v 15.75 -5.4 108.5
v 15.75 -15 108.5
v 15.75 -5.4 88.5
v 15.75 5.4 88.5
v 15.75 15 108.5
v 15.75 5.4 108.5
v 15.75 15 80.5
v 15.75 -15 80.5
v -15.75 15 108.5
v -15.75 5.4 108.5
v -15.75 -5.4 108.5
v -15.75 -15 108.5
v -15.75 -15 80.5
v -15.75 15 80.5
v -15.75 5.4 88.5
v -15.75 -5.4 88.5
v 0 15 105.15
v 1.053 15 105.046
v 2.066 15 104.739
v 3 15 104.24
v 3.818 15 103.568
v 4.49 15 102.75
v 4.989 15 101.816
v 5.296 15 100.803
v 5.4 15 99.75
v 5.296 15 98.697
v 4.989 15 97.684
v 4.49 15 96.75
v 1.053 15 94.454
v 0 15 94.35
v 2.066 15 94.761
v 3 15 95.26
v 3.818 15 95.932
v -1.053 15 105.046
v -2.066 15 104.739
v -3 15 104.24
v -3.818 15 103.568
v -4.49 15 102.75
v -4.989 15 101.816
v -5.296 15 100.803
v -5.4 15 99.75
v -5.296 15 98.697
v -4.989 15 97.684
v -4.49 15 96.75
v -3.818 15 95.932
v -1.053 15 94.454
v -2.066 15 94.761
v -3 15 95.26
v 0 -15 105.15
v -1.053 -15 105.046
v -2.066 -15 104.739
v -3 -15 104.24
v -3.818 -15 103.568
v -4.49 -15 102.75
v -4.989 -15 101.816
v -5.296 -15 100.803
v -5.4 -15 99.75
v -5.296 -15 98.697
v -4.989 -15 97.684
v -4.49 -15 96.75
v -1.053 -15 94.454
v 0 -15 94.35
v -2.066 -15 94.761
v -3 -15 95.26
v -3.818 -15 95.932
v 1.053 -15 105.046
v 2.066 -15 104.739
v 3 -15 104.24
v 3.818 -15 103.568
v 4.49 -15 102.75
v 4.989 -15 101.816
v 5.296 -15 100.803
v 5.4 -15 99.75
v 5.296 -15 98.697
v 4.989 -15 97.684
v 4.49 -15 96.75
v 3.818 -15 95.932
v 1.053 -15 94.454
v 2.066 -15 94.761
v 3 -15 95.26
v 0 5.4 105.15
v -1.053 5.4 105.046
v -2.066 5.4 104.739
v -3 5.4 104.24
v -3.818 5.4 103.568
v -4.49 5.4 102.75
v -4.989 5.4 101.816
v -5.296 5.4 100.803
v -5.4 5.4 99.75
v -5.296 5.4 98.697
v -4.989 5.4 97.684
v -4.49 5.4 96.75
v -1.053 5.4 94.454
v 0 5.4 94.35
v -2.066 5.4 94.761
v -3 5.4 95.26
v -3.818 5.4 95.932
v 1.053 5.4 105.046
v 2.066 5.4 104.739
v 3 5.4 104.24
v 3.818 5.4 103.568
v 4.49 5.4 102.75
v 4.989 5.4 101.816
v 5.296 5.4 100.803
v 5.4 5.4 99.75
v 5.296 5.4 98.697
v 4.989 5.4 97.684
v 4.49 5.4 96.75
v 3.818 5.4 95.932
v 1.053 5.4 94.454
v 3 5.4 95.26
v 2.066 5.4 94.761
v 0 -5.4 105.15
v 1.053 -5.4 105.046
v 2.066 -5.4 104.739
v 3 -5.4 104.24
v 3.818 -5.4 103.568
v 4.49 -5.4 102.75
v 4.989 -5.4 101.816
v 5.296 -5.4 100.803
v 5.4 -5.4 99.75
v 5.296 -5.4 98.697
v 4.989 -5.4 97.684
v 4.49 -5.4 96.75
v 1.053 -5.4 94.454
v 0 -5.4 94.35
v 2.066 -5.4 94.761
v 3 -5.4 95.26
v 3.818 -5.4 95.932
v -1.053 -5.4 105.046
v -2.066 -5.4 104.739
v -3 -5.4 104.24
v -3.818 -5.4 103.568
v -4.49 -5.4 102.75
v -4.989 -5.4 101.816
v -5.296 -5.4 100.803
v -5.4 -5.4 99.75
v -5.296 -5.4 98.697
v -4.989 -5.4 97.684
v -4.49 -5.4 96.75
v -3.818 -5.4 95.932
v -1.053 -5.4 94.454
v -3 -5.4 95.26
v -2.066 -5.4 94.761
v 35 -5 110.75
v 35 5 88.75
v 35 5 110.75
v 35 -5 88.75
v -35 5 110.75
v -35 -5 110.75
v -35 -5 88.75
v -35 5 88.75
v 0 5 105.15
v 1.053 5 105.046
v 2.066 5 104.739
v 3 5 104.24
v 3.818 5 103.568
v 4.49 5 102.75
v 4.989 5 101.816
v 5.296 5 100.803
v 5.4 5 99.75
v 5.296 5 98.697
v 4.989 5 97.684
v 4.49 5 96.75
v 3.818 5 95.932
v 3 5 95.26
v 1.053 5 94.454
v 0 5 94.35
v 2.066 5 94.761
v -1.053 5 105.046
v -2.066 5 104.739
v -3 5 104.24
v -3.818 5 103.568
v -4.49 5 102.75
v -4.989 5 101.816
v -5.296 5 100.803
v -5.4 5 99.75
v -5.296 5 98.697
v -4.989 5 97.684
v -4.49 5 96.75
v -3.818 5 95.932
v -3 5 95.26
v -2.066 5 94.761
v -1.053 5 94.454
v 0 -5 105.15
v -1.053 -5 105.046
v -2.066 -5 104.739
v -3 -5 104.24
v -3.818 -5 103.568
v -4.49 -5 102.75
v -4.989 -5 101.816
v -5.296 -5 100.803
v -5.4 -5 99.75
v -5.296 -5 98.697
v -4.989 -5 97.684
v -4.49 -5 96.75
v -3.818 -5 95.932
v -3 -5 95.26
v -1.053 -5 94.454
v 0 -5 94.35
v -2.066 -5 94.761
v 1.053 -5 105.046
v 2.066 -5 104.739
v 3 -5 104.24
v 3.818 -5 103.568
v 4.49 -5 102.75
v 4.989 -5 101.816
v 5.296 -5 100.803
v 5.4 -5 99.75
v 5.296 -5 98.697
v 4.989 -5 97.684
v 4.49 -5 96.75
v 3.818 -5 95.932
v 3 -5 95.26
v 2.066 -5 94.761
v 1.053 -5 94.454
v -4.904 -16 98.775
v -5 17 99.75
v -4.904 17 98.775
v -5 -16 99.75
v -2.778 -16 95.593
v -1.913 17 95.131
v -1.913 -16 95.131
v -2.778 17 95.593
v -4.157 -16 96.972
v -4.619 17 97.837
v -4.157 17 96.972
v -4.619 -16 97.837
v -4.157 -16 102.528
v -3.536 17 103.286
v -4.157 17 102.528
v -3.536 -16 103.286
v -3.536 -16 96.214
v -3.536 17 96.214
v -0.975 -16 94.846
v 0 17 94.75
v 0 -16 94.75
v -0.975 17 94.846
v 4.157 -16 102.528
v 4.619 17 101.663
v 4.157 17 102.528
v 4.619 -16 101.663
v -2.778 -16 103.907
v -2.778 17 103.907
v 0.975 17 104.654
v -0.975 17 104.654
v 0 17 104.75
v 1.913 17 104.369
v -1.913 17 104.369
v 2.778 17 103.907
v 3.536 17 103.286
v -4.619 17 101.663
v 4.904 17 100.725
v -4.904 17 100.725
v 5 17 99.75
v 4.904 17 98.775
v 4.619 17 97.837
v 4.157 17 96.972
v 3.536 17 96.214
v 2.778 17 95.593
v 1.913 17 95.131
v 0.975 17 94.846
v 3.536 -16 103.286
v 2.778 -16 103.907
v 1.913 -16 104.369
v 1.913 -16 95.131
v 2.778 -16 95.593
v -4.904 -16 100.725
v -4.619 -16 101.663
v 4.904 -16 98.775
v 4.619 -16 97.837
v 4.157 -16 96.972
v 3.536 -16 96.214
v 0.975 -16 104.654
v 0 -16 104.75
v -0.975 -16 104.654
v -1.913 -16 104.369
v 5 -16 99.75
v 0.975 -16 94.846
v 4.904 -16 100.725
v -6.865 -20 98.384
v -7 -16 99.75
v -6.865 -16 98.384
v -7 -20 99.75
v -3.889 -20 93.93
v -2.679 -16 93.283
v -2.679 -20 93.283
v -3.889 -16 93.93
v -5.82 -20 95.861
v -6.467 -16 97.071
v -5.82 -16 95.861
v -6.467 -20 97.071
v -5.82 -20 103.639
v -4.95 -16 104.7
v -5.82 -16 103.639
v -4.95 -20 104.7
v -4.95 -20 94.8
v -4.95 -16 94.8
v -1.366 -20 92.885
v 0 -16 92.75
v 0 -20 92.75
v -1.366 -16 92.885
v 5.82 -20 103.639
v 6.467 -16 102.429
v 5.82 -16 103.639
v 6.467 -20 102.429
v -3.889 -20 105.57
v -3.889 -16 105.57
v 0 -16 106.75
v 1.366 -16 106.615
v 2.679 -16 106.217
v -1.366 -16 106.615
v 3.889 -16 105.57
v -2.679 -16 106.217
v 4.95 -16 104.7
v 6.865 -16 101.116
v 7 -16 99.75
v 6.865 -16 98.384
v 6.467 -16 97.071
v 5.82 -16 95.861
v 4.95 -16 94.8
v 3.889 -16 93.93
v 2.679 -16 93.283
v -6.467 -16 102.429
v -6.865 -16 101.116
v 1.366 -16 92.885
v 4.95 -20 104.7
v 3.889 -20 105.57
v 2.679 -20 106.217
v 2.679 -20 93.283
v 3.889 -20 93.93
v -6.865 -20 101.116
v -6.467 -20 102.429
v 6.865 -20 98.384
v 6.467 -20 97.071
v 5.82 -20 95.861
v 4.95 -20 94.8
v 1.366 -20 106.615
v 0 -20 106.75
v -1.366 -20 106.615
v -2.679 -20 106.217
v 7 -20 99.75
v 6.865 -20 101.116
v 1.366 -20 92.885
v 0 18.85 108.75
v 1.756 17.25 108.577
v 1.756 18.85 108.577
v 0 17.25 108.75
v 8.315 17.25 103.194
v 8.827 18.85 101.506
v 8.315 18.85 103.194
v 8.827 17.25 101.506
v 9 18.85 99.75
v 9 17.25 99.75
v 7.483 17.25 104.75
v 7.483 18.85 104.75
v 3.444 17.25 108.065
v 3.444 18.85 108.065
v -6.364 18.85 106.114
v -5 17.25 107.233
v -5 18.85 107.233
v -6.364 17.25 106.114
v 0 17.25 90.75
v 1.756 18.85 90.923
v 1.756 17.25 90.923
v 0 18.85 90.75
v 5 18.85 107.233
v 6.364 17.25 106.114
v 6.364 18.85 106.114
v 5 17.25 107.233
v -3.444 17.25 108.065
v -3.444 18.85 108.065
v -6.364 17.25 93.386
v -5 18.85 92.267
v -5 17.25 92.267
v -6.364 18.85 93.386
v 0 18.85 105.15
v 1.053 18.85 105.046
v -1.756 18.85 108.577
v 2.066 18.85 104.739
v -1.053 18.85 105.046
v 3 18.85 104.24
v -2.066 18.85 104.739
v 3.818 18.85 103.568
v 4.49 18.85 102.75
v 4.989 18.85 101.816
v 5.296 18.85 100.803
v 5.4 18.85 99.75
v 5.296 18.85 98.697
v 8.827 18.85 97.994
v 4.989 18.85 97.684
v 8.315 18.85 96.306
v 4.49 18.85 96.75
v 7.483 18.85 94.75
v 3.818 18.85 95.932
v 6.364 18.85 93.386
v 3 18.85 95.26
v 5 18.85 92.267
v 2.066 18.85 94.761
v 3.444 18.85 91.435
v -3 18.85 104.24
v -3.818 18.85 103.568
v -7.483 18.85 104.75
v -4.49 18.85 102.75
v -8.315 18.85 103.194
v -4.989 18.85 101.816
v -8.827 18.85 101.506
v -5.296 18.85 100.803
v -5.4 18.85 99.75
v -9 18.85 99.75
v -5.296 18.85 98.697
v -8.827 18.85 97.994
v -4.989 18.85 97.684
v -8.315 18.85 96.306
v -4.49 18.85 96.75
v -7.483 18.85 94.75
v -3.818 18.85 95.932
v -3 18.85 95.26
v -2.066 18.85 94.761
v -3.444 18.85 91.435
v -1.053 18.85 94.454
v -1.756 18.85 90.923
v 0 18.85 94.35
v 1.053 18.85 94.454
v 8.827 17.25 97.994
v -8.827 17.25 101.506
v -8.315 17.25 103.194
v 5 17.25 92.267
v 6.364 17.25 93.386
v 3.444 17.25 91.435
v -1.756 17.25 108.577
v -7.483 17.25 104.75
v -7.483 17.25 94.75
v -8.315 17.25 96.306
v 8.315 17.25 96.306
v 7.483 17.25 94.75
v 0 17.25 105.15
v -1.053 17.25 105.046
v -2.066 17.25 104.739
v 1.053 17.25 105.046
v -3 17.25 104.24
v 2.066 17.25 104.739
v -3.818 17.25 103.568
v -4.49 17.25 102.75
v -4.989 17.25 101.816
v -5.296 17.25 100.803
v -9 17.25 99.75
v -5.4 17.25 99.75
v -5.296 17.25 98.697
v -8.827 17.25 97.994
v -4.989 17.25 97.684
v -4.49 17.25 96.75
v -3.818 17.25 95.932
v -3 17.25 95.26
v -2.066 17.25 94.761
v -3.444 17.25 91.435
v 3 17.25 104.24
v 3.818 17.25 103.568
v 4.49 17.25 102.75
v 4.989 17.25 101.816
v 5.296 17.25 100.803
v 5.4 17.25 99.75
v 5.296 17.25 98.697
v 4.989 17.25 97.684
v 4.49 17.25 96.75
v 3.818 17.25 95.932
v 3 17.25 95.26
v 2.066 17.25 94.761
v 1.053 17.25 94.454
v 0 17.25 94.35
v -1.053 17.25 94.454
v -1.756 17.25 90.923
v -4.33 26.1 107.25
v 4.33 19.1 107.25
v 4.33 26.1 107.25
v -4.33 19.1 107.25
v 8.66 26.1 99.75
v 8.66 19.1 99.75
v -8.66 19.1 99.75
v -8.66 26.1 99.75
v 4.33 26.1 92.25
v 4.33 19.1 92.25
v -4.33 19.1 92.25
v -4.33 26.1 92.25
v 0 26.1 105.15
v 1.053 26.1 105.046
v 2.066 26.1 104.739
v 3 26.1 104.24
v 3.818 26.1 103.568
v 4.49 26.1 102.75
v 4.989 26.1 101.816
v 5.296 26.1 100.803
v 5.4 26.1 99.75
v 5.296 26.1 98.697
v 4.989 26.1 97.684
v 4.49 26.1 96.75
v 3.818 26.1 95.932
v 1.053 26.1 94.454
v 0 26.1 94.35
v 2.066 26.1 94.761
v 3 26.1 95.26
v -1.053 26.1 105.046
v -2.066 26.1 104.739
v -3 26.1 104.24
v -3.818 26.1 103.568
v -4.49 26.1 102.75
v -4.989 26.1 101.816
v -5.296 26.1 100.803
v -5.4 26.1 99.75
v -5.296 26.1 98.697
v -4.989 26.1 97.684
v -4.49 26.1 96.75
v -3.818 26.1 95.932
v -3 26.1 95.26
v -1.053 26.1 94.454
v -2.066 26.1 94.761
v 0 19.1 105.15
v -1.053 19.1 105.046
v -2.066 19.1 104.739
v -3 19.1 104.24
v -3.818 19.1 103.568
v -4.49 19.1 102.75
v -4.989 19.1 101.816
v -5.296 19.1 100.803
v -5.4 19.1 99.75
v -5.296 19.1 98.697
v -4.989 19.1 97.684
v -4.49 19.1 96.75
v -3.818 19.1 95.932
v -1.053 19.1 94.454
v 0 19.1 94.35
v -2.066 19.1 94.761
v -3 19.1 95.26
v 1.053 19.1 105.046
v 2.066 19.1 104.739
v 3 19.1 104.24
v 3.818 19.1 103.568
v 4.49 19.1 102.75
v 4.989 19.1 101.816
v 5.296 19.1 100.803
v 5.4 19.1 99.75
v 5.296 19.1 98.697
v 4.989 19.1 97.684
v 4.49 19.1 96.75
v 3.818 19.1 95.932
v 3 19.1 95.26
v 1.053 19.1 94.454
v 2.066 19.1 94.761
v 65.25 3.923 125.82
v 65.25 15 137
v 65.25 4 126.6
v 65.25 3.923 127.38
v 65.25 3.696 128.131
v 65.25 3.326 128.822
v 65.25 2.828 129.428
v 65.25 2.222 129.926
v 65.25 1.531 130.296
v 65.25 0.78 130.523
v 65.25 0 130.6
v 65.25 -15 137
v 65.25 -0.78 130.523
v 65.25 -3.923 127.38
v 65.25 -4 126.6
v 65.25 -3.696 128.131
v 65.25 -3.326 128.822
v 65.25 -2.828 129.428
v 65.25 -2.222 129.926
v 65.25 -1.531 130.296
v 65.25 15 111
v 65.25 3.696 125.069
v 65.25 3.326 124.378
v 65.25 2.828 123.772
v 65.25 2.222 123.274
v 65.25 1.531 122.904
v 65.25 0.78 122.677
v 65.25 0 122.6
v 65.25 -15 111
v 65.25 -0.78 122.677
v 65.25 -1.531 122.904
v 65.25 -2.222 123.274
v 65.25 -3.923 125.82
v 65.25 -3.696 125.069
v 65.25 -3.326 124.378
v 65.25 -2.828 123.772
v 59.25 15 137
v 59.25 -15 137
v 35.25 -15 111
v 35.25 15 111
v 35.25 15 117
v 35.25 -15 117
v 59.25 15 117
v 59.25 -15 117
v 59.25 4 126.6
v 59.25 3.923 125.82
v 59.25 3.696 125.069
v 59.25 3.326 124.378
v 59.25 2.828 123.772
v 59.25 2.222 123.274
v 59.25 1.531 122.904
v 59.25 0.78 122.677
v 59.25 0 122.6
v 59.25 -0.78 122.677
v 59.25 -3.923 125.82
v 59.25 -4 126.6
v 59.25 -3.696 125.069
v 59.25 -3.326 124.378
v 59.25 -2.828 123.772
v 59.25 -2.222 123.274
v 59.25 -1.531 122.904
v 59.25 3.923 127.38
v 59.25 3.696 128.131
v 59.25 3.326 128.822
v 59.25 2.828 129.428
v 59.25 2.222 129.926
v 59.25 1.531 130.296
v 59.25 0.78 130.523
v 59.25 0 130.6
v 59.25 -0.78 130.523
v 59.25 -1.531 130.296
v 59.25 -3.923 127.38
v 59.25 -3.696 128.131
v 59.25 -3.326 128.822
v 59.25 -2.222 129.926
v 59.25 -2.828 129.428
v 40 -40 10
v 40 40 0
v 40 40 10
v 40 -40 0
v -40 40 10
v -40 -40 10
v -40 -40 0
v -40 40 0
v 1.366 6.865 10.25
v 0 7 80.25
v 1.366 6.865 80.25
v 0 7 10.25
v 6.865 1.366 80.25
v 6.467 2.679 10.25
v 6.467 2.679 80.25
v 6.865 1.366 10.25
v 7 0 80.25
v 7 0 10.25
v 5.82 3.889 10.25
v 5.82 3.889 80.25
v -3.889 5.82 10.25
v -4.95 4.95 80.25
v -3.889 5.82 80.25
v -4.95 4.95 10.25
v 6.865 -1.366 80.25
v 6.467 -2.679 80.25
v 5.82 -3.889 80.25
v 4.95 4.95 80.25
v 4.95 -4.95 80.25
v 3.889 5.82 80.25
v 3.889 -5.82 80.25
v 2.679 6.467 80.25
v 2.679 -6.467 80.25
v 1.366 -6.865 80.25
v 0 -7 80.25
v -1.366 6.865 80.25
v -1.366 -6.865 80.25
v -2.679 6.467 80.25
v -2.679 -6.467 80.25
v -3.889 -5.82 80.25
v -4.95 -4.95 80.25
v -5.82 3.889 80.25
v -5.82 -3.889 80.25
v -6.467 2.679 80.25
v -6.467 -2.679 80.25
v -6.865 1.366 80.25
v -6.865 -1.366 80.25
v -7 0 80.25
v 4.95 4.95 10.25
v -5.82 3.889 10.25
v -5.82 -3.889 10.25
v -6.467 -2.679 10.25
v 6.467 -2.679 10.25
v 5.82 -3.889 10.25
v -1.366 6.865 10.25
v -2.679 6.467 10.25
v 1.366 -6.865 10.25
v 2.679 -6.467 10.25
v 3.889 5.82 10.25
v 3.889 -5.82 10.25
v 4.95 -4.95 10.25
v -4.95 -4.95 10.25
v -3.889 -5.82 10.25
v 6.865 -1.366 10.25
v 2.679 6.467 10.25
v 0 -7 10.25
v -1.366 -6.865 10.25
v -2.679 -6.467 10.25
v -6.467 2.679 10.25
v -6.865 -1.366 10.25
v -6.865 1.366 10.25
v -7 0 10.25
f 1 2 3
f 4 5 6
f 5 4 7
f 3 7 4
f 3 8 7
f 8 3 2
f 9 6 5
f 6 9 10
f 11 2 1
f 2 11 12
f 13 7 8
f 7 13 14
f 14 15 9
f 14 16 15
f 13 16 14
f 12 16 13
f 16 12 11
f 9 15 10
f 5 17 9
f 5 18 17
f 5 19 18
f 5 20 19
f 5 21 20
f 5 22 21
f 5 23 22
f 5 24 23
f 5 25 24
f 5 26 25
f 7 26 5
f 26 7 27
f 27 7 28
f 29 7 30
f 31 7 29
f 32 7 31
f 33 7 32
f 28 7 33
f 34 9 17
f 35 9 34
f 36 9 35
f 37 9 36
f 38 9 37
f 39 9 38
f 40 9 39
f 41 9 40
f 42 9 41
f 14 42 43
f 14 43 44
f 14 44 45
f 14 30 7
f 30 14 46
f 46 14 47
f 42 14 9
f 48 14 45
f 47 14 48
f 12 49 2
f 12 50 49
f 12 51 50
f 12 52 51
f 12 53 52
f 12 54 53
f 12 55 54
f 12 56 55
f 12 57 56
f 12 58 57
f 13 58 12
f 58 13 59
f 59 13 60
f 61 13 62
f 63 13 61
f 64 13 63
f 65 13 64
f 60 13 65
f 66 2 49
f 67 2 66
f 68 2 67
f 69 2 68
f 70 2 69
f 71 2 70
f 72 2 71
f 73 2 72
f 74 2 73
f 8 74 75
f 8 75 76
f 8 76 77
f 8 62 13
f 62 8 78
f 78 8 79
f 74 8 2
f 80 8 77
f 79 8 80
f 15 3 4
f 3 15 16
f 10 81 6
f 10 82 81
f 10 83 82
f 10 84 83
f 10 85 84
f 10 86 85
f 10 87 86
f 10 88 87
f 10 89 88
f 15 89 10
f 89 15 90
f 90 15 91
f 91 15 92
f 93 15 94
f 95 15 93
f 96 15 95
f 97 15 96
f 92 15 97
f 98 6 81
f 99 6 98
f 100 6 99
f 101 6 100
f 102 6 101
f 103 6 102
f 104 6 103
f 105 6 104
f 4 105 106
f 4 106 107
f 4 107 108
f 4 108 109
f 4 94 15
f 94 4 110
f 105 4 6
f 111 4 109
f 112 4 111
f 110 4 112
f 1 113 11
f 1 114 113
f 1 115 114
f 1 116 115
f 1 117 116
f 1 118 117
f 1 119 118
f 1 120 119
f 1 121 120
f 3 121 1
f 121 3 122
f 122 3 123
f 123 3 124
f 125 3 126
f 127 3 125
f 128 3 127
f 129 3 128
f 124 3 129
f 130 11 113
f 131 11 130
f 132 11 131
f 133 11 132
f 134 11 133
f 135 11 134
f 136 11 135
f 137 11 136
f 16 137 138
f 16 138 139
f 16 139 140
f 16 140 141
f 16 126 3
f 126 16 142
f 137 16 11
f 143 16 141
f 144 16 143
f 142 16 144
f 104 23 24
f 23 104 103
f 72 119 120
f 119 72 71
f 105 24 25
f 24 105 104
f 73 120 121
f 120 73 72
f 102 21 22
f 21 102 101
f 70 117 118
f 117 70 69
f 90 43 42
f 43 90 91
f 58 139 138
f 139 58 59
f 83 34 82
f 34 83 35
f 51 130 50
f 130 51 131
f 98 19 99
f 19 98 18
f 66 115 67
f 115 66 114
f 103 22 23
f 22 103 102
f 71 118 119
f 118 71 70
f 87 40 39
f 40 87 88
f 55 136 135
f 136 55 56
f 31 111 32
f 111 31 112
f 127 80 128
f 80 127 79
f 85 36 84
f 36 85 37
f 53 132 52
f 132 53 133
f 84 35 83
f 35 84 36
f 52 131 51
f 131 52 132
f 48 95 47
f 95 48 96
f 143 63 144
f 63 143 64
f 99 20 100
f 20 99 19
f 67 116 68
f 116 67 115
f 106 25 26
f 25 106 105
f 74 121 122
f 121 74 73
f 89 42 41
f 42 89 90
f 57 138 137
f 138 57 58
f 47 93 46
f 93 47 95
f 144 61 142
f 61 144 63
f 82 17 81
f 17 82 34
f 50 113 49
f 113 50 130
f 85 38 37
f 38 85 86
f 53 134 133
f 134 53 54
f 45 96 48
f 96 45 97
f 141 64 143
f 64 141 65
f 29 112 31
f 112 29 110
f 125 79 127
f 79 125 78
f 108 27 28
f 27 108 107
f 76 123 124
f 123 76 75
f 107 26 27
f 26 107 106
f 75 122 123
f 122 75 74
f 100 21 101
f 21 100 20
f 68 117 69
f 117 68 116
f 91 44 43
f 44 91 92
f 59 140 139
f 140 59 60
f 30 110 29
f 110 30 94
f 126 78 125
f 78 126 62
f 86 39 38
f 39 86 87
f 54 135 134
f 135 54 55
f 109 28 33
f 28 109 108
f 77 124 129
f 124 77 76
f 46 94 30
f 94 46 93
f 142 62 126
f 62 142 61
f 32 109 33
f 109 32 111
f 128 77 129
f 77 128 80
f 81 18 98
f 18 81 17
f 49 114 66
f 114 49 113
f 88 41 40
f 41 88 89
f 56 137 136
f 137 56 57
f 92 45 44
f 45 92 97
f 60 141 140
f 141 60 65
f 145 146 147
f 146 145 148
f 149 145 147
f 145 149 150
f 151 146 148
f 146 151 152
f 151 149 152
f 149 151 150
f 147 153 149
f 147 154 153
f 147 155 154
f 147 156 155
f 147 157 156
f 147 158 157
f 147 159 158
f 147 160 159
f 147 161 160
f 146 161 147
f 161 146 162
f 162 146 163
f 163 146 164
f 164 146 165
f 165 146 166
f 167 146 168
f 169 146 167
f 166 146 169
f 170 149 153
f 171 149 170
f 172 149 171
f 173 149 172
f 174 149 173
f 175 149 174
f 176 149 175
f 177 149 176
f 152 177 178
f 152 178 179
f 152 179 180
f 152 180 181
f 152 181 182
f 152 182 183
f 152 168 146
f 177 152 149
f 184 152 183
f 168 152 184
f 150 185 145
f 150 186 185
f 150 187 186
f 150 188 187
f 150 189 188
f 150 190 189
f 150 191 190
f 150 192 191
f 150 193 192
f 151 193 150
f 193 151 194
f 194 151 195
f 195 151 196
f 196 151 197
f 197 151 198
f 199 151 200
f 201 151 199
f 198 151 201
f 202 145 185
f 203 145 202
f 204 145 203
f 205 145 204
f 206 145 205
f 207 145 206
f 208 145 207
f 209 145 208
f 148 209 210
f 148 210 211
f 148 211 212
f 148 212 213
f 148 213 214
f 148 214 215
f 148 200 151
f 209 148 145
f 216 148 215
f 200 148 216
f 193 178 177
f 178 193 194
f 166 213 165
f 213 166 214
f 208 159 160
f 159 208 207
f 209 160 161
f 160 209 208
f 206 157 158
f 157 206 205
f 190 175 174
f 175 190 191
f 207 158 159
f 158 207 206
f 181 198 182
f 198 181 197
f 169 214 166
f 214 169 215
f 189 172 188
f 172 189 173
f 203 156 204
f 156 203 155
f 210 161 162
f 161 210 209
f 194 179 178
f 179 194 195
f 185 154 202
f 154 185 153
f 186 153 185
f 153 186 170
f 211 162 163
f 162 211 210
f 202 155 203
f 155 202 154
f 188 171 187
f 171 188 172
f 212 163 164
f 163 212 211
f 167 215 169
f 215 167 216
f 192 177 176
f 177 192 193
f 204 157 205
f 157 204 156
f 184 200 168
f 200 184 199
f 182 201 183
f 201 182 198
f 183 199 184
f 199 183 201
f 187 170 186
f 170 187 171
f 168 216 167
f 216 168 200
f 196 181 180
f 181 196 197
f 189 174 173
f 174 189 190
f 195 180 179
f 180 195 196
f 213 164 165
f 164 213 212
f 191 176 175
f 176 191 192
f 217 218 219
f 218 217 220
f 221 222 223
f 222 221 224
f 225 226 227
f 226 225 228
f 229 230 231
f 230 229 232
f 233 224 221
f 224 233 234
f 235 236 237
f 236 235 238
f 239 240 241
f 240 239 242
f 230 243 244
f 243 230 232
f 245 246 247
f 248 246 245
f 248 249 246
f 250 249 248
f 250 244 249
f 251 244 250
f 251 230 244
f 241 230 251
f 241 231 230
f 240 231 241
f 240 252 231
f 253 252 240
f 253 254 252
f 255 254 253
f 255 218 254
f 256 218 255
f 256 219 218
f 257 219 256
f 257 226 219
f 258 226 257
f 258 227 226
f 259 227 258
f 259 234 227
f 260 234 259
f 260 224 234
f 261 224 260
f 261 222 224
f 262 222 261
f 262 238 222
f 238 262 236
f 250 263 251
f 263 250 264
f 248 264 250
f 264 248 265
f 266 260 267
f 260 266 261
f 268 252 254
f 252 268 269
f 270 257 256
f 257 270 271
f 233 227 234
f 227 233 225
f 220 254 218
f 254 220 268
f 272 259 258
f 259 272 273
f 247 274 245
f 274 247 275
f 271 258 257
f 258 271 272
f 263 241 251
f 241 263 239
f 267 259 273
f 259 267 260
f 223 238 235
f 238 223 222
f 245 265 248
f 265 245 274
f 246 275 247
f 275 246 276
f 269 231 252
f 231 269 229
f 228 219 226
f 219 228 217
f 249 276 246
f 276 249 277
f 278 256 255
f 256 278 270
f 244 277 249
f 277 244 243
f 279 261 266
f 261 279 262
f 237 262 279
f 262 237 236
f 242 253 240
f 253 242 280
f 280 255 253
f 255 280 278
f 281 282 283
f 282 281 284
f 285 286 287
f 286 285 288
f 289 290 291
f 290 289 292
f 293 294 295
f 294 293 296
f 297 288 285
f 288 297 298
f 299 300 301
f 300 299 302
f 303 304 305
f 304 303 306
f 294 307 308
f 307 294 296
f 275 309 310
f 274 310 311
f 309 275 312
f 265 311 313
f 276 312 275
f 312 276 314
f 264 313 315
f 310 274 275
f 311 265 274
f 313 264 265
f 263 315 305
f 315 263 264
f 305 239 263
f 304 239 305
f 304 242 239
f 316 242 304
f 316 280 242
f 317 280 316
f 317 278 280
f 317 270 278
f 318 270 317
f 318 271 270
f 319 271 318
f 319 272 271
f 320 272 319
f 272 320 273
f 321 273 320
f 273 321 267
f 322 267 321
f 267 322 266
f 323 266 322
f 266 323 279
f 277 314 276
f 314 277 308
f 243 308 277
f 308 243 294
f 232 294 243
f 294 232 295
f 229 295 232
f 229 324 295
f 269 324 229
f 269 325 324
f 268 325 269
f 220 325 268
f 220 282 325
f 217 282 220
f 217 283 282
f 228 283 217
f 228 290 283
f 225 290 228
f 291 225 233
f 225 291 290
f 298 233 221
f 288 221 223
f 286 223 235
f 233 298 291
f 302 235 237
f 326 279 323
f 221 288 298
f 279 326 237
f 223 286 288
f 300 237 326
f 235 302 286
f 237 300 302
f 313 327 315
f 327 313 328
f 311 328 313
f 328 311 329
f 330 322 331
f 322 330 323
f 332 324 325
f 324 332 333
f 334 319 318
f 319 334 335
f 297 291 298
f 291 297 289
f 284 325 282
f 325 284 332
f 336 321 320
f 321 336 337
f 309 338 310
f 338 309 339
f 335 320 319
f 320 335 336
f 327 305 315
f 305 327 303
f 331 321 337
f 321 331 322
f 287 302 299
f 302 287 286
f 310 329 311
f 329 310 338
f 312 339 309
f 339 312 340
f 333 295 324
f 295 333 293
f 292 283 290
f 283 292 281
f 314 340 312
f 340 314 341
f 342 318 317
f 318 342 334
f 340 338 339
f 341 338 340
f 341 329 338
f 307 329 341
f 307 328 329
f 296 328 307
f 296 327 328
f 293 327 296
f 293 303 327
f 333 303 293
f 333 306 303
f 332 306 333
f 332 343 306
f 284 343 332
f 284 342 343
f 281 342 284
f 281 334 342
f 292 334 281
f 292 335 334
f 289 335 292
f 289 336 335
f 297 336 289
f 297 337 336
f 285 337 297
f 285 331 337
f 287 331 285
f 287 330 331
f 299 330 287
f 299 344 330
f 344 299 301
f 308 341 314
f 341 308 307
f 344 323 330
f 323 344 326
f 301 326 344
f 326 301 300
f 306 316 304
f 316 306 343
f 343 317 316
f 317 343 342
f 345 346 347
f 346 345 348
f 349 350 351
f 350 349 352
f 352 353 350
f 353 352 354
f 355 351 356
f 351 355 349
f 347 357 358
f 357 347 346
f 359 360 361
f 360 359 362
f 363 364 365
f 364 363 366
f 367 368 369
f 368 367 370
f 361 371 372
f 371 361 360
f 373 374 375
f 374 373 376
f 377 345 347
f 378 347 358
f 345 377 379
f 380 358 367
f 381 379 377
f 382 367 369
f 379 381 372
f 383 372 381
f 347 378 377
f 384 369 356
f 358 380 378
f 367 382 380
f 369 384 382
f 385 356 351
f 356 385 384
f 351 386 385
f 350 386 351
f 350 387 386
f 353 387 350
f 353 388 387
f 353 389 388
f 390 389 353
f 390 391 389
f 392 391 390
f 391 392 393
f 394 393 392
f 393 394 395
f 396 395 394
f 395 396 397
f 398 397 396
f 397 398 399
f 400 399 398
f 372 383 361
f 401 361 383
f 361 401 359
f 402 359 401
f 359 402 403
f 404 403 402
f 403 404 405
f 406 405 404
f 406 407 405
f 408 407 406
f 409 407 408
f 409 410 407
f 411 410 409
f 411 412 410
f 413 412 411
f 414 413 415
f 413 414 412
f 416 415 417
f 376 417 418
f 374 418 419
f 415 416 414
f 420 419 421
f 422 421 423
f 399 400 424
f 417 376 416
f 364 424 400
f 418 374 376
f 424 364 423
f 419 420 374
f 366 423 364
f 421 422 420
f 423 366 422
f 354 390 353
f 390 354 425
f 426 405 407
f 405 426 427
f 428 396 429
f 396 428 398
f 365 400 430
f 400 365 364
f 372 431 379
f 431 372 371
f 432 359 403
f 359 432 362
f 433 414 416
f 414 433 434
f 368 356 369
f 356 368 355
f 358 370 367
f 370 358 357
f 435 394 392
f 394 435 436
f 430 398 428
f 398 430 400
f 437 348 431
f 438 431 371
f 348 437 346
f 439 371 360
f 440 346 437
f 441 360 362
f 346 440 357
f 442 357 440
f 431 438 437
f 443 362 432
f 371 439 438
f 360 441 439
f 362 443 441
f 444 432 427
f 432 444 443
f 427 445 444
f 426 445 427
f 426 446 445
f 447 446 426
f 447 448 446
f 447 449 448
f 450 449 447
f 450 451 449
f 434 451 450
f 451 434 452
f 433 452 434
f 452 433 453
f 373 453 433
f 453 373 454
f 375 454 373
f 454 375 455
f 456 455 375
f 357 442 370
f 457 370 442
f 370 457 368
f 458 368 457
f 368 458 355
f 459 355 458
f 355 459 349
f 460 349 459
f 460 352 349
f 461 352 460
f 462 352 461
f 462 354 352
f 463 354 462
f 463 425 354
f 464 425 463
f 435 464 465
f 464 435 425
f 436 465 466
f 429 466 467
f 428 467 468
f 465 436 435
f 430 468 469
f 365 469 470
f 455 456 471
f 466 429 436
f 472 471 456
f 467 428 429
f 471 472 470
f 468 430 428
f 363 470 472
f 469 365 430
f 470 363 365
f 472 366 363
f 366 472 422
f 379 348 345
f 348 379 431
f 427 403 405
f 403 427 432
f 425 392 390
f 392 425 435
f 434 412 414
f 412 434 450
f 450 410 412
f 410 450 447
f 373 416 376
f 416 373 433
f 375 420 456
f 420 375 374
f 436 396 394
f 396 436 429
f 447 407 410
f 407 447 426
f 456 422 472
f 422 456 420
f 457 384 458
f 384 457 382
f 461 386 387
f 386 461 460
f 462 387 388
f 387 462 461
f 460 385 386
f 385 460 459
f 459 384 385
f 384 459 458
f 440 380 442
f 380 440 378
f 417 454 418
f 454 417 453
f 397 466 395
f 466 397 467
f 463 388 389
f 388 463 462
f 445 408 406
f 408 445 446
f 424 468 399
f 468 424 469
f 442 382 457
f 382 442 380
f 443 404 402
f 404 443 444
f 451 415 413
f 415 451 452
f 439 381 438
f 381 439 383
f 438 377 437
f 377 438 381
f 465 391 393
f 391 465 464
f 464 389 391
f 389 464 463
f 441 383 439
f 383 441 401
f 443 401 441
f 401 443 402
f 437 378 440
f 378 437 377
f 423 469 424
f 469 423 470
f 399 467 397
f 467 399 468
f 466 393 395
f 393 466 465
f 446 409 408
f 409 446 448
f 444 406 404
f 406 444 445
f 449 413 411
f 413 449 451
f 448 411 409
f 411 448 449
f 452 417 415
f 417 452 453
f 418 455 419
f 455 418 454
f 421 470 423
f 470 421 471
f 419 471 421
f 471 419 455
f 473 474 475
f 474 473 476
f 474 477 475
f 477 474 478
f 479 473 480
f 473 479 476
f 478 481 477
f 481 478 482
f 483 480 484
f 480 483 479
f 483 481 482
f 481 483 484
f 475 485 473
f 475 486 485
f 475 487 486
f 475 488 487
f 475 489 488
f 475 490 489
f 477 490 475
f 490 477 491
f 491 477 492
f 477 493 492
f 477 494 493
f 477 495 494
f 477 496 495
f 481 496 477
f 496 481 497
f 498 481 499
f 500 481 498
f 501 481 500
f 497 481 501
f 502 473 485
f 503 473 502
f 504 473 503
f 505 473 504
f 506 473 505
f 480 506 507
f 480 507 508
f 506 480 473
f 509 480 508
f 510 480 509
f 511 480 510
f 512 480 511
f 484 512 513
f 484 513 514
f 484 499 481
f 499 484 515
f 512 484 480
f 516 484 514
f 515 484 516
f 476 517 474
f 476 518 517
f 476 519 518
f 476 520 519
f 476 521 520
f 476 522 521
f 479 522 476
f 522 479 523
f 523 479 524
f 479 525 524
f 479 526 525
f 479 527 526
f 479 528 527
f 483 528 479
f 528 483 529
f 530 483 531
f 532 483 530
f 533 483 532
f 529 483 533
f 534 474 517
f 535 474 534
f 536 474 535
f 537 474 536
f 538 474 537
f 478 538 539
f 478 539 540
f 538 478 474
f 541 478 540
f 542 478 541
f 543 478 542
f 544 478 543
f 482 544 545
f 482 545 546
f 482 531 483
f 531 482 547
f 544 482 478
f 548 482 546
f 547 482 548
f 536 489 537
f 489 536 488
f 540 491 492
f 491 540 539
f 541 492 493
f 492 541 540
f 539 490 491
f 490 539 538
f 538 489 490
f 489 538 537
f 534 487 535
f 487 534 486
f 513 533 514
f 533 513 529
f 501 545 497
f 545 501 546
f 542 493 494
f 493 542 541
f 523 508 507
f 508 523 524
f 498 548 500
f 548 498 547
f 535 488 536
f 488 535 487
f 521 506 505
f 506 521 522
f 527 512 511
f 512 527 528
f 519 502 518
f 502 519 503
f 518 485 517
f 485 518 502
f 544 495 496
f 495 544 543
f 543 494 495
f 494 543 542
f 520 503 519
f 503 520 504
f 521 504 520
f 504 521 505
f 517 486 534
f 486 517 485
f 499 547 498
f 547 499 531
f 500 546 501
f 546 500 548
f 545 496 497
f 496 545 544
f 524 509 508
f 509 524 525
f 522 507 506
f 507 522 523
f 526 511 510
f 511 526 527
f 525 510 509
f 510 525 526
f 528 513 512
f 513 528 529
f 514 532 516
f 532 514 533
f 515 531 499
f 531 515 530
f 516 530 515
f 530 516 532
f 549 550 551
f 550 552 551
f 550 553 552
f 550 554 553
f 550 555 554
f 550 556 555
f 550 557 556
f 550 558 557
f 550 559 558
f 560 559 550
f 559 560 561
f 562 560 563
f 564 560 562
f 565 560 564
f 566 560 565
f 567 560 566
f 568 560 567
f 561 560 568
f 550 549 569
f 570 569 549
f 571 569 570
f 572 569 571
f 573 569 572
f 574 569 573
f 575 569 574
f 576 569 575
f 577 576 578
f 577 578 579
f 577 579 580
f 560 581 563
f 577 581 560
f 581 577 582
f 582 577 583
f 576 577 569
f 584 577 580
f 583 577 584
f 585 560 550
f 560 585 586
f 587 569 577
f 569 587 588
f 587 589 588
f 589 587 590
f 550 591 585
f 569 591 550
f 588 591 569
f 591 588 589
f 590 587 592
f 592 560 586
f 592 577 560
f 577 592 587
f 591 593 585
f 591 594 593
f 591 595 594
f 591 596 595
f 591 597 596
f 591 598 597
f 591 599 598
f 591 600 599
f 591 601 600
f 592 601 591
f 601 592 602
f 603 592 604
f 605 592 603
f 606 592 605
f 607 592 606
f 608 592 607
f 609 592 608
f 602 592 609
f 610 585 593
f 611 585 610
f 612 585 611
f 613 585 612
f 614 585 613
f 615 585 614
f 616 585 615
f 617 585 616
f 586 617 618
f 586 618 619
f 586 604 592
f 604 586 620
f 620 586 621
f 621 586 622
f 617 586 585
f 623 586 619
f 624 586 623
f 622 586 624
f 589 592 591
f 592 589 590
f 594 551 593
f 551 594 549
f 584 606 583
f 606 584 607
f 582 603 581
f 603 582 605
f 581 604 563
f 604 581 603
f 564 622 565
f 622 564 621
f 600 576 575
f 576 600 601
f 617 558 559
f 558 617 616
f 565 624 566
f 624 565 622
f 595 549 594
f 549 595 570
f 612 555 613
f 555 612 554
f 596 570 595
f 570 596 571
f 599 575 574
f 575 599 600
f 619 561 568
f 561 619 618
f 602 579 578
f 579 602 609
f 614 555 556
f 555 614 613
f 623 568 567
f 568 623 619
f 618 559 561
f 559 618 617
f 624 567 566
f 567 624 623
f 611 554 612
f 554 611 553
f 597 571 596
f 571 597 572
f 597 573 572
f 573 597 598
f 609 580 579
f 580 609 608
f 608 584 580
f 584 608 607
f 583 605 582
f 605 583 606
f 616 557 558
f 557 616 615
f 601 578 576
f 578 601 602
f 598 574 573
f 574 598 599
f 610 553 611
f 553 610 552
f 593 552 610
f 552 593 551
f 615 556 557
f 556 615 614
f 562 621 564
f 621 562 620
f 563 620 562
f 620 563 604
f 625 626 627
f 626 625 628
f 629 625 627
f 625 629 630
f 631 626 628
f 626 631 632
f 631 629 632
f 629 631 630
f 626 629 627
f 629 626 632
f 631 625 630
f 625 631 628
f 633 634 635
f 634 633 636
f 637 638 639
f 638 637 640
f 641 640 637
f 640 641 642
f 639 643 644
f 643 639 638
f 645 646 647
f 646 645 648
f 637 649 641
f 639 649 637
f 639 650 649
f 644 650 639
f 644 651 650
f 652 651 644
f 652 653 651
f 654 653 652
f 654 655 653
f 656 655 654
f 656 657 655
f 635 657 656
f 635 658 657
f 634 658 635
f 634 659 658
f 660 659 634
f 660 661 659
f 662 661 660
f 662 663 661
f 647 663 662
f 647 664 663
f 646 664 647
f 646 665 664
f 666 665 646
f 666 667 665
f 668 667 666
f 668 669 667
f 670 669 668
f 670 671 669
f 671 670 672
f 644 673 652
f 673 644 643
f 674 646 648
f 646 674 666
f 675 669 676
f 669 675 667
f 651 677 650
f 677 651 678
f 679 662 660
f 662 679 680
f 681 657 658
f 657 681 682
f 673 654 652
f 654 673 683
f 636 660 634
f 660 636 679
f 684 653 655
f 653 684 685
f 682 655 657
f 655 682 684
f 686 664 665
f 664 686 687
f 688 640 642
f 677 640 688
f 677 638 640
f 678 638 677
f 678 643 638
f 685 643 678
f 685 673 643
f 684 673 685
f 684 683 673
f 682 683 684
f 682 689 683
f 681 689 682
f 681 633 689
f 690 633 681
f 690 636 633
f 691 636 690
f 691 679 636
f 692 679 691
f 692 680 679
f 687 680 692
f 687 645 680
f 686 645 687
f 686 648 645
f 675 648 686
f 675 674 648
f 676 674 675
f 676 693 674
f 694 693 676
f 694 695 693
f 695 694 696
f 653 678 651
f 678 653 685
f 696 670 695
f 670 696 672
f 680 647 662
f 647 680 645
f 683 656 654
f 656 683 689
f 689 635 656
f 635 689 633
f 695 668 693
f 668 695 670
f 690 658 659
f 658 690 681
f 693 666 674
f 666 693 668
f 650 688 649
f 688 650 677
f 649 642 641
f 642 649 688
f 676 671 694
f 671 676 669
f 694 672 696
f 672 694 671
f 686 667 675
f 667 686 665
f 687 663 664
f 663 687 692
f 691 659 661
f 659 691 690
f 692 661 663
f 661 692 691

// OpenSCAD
$fn = 32;

// ------------------------------------------------------------------------
// Lamp arm: column d14 x 70 mm, arm 70 mm
// Every part is its own module, assembly() places every instance.
// ------------------------------------------------------------------------

// --- part 1 ---
module lamp_base() {
  difference() {
    translate([-40, -40, 0]) cube([80, 80, 10]);
  }
}

// --- part 2 ---
module lamp_column() {
  cylinder(h = 70, d = 14);
}

// --- part 3 ---
module head_fork() {
  difference() {
    translate([-15.75, -15, 0]) cube([31.5, 30, 28]);
    translate([-16.75, -5.4, 8]) cube([33.5, 10.8, 21]);
    translate([0, 0, 19.25]) rotate([90, 0, 0]) cylinder(h = 32, d = 10.8, center = true);
  }
}

// --- part 4 ---
module lamp_arm() {
  difference() {
    translate([-35, -5, 0]) cube([70, 10, 22]);
    translate([0, 0, 11]) rotate([90, 0, 0]) cylinder(h = 12, d = 10.8, center = true);
  }
}

// --- part 5 ---
module arm_pin() {
  rotate([0, 90, 0]) cylinder(h = 34, d = 10, center = true);
  translate([-20, 0, 0]) rotate([0, 90, 0]) cylinder(h = 4, d = 14);
}

// --- part 6 ---
module arm_washer() {
  difference() {
      translate([0, 0, 0]) cylinder(h = 1.6, d = 18);
      translate([0, 0, -1]) cylinder(h = 3.6, d = 10.8);
    }
}

// --- part 7 ---
module arm_nut() {
  difference() {
    linear_extrude(height = 7) polygon(points = [[8.66, 0], [4.33, 7.5], [-4.33, 7.5], [-8.66, 0], [-4.33, -7.5], [4.33, -7.5]]);
    translate([0, 0, -1]) cylinder(h = 9, d = 10.8);
  }
}

// --- part 8 ---
module shade_bracket() {
  difference() {
    translate([-15, -15, 0]) cube([30, 30, 26]);
    translate([-16, -16, 6]) cube([25, 32, 21]);
    translate([12, 0, 15.6]) rotate([0, 90, 0]) cylinder(h = 8, d = 8, center = true);
  }
}

// --- assembly ---
module assembly() {
  color([0.80, 0.24, 0.20]) translate([0, 0, 0]) rotate([0, 0, 0]) lamp_base();
  color([0.20, 0.45, 0.75]) translate([0, 0, 10.25]) rotate([0, 0, 0]) lamp_column();
  color([0.25, 0.62, 0.32]) translate([0, 0, 80.5]) rotate([0, 0, 0]) head_fork();
  color([0.92, 0.70, 0.18]) translate([0, 0, 88.75]) rotate([0, 0, 0]) lamp_arm();
  color([0.58, 0.35, 0.70]) translate([0, 0, 99.75]) rotate([0, 0, 90]) arm_pin();
  color([0.16, 0.66, 0.66]) translate([0, 18.85, 99.75]) rotate([90, 0, 0]) arm_washer();
  color([0.85, 0.48, 0.18]) translate([0, 26.1, 99.75]) rotate([90, 0, 0]) arm_nut();
  color([0.55, 0.60, 0.65]) translate([50.25, 0, 111]) rotate([0, 0, 0]) shade_bracket();
}

assembly();
